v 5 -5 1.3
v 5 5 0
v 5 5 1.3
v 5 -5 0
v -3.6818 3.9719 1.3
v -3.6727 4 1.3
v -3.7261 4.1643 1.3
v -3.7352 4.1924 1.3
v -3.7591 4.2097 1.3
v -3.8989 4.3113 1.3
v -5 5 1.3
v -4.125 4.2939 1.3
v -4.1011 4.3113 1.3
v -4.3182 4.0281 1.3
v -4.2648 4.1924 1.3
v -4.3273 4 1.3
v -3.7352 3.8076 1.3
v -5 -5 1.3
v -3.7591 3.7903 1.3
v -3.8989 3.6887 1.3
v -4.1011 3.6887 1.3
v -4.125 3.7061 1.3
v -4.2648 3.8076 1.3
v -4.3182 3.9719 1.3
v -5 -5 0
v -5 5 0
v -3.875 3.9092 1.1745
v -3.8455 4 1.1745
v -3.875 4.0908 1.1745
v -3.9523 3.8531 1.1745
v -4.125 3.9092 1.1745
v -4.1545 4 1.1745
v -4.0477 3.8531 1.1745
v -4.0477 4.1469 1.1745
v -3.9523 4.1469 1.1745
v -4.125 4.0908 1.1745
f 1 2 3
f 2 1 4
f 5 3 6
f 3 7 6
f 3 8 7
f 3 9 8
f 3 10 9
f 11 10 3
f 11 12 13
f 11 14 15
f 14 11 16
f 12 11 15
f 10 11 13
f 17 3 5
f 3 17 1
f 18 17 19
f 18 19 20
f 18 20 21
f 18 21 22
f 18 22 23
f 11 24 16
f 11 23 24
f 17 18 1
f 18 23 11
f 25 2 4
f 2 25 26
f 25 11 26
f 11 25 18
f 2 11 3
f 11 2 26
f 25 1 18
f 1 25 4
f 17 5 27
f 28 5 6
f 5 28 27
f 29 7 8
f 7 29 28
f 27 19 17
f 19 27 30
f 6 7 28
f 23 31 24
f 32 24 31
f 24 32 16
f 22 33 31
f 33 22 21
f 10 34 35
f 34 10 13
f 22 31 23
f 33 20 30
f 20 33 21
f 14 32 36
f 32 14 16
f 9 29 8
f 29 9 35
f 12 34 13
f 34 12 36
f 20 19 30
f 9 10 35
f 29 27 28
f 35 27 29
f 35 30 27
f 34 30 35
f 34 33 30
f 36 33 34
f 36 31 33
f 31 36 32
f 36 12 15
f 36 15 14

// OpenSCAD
/*
 * Creates the SkyTraq Venus638 GPS Receiver.
 *
 * Author: Ian McInerney
 * Created: June 22, 2013
 */

// Create the chip
translate([0.0,0.0,0.65])difference() {
	// The main chip body
	cube(size=[10.0,10.0,1.3], center=true);

	// The bump to indicate pin 1
	translate([-4.0,4.0,1.0])sphere(r=0.5, center=true, $fn=10);
}
